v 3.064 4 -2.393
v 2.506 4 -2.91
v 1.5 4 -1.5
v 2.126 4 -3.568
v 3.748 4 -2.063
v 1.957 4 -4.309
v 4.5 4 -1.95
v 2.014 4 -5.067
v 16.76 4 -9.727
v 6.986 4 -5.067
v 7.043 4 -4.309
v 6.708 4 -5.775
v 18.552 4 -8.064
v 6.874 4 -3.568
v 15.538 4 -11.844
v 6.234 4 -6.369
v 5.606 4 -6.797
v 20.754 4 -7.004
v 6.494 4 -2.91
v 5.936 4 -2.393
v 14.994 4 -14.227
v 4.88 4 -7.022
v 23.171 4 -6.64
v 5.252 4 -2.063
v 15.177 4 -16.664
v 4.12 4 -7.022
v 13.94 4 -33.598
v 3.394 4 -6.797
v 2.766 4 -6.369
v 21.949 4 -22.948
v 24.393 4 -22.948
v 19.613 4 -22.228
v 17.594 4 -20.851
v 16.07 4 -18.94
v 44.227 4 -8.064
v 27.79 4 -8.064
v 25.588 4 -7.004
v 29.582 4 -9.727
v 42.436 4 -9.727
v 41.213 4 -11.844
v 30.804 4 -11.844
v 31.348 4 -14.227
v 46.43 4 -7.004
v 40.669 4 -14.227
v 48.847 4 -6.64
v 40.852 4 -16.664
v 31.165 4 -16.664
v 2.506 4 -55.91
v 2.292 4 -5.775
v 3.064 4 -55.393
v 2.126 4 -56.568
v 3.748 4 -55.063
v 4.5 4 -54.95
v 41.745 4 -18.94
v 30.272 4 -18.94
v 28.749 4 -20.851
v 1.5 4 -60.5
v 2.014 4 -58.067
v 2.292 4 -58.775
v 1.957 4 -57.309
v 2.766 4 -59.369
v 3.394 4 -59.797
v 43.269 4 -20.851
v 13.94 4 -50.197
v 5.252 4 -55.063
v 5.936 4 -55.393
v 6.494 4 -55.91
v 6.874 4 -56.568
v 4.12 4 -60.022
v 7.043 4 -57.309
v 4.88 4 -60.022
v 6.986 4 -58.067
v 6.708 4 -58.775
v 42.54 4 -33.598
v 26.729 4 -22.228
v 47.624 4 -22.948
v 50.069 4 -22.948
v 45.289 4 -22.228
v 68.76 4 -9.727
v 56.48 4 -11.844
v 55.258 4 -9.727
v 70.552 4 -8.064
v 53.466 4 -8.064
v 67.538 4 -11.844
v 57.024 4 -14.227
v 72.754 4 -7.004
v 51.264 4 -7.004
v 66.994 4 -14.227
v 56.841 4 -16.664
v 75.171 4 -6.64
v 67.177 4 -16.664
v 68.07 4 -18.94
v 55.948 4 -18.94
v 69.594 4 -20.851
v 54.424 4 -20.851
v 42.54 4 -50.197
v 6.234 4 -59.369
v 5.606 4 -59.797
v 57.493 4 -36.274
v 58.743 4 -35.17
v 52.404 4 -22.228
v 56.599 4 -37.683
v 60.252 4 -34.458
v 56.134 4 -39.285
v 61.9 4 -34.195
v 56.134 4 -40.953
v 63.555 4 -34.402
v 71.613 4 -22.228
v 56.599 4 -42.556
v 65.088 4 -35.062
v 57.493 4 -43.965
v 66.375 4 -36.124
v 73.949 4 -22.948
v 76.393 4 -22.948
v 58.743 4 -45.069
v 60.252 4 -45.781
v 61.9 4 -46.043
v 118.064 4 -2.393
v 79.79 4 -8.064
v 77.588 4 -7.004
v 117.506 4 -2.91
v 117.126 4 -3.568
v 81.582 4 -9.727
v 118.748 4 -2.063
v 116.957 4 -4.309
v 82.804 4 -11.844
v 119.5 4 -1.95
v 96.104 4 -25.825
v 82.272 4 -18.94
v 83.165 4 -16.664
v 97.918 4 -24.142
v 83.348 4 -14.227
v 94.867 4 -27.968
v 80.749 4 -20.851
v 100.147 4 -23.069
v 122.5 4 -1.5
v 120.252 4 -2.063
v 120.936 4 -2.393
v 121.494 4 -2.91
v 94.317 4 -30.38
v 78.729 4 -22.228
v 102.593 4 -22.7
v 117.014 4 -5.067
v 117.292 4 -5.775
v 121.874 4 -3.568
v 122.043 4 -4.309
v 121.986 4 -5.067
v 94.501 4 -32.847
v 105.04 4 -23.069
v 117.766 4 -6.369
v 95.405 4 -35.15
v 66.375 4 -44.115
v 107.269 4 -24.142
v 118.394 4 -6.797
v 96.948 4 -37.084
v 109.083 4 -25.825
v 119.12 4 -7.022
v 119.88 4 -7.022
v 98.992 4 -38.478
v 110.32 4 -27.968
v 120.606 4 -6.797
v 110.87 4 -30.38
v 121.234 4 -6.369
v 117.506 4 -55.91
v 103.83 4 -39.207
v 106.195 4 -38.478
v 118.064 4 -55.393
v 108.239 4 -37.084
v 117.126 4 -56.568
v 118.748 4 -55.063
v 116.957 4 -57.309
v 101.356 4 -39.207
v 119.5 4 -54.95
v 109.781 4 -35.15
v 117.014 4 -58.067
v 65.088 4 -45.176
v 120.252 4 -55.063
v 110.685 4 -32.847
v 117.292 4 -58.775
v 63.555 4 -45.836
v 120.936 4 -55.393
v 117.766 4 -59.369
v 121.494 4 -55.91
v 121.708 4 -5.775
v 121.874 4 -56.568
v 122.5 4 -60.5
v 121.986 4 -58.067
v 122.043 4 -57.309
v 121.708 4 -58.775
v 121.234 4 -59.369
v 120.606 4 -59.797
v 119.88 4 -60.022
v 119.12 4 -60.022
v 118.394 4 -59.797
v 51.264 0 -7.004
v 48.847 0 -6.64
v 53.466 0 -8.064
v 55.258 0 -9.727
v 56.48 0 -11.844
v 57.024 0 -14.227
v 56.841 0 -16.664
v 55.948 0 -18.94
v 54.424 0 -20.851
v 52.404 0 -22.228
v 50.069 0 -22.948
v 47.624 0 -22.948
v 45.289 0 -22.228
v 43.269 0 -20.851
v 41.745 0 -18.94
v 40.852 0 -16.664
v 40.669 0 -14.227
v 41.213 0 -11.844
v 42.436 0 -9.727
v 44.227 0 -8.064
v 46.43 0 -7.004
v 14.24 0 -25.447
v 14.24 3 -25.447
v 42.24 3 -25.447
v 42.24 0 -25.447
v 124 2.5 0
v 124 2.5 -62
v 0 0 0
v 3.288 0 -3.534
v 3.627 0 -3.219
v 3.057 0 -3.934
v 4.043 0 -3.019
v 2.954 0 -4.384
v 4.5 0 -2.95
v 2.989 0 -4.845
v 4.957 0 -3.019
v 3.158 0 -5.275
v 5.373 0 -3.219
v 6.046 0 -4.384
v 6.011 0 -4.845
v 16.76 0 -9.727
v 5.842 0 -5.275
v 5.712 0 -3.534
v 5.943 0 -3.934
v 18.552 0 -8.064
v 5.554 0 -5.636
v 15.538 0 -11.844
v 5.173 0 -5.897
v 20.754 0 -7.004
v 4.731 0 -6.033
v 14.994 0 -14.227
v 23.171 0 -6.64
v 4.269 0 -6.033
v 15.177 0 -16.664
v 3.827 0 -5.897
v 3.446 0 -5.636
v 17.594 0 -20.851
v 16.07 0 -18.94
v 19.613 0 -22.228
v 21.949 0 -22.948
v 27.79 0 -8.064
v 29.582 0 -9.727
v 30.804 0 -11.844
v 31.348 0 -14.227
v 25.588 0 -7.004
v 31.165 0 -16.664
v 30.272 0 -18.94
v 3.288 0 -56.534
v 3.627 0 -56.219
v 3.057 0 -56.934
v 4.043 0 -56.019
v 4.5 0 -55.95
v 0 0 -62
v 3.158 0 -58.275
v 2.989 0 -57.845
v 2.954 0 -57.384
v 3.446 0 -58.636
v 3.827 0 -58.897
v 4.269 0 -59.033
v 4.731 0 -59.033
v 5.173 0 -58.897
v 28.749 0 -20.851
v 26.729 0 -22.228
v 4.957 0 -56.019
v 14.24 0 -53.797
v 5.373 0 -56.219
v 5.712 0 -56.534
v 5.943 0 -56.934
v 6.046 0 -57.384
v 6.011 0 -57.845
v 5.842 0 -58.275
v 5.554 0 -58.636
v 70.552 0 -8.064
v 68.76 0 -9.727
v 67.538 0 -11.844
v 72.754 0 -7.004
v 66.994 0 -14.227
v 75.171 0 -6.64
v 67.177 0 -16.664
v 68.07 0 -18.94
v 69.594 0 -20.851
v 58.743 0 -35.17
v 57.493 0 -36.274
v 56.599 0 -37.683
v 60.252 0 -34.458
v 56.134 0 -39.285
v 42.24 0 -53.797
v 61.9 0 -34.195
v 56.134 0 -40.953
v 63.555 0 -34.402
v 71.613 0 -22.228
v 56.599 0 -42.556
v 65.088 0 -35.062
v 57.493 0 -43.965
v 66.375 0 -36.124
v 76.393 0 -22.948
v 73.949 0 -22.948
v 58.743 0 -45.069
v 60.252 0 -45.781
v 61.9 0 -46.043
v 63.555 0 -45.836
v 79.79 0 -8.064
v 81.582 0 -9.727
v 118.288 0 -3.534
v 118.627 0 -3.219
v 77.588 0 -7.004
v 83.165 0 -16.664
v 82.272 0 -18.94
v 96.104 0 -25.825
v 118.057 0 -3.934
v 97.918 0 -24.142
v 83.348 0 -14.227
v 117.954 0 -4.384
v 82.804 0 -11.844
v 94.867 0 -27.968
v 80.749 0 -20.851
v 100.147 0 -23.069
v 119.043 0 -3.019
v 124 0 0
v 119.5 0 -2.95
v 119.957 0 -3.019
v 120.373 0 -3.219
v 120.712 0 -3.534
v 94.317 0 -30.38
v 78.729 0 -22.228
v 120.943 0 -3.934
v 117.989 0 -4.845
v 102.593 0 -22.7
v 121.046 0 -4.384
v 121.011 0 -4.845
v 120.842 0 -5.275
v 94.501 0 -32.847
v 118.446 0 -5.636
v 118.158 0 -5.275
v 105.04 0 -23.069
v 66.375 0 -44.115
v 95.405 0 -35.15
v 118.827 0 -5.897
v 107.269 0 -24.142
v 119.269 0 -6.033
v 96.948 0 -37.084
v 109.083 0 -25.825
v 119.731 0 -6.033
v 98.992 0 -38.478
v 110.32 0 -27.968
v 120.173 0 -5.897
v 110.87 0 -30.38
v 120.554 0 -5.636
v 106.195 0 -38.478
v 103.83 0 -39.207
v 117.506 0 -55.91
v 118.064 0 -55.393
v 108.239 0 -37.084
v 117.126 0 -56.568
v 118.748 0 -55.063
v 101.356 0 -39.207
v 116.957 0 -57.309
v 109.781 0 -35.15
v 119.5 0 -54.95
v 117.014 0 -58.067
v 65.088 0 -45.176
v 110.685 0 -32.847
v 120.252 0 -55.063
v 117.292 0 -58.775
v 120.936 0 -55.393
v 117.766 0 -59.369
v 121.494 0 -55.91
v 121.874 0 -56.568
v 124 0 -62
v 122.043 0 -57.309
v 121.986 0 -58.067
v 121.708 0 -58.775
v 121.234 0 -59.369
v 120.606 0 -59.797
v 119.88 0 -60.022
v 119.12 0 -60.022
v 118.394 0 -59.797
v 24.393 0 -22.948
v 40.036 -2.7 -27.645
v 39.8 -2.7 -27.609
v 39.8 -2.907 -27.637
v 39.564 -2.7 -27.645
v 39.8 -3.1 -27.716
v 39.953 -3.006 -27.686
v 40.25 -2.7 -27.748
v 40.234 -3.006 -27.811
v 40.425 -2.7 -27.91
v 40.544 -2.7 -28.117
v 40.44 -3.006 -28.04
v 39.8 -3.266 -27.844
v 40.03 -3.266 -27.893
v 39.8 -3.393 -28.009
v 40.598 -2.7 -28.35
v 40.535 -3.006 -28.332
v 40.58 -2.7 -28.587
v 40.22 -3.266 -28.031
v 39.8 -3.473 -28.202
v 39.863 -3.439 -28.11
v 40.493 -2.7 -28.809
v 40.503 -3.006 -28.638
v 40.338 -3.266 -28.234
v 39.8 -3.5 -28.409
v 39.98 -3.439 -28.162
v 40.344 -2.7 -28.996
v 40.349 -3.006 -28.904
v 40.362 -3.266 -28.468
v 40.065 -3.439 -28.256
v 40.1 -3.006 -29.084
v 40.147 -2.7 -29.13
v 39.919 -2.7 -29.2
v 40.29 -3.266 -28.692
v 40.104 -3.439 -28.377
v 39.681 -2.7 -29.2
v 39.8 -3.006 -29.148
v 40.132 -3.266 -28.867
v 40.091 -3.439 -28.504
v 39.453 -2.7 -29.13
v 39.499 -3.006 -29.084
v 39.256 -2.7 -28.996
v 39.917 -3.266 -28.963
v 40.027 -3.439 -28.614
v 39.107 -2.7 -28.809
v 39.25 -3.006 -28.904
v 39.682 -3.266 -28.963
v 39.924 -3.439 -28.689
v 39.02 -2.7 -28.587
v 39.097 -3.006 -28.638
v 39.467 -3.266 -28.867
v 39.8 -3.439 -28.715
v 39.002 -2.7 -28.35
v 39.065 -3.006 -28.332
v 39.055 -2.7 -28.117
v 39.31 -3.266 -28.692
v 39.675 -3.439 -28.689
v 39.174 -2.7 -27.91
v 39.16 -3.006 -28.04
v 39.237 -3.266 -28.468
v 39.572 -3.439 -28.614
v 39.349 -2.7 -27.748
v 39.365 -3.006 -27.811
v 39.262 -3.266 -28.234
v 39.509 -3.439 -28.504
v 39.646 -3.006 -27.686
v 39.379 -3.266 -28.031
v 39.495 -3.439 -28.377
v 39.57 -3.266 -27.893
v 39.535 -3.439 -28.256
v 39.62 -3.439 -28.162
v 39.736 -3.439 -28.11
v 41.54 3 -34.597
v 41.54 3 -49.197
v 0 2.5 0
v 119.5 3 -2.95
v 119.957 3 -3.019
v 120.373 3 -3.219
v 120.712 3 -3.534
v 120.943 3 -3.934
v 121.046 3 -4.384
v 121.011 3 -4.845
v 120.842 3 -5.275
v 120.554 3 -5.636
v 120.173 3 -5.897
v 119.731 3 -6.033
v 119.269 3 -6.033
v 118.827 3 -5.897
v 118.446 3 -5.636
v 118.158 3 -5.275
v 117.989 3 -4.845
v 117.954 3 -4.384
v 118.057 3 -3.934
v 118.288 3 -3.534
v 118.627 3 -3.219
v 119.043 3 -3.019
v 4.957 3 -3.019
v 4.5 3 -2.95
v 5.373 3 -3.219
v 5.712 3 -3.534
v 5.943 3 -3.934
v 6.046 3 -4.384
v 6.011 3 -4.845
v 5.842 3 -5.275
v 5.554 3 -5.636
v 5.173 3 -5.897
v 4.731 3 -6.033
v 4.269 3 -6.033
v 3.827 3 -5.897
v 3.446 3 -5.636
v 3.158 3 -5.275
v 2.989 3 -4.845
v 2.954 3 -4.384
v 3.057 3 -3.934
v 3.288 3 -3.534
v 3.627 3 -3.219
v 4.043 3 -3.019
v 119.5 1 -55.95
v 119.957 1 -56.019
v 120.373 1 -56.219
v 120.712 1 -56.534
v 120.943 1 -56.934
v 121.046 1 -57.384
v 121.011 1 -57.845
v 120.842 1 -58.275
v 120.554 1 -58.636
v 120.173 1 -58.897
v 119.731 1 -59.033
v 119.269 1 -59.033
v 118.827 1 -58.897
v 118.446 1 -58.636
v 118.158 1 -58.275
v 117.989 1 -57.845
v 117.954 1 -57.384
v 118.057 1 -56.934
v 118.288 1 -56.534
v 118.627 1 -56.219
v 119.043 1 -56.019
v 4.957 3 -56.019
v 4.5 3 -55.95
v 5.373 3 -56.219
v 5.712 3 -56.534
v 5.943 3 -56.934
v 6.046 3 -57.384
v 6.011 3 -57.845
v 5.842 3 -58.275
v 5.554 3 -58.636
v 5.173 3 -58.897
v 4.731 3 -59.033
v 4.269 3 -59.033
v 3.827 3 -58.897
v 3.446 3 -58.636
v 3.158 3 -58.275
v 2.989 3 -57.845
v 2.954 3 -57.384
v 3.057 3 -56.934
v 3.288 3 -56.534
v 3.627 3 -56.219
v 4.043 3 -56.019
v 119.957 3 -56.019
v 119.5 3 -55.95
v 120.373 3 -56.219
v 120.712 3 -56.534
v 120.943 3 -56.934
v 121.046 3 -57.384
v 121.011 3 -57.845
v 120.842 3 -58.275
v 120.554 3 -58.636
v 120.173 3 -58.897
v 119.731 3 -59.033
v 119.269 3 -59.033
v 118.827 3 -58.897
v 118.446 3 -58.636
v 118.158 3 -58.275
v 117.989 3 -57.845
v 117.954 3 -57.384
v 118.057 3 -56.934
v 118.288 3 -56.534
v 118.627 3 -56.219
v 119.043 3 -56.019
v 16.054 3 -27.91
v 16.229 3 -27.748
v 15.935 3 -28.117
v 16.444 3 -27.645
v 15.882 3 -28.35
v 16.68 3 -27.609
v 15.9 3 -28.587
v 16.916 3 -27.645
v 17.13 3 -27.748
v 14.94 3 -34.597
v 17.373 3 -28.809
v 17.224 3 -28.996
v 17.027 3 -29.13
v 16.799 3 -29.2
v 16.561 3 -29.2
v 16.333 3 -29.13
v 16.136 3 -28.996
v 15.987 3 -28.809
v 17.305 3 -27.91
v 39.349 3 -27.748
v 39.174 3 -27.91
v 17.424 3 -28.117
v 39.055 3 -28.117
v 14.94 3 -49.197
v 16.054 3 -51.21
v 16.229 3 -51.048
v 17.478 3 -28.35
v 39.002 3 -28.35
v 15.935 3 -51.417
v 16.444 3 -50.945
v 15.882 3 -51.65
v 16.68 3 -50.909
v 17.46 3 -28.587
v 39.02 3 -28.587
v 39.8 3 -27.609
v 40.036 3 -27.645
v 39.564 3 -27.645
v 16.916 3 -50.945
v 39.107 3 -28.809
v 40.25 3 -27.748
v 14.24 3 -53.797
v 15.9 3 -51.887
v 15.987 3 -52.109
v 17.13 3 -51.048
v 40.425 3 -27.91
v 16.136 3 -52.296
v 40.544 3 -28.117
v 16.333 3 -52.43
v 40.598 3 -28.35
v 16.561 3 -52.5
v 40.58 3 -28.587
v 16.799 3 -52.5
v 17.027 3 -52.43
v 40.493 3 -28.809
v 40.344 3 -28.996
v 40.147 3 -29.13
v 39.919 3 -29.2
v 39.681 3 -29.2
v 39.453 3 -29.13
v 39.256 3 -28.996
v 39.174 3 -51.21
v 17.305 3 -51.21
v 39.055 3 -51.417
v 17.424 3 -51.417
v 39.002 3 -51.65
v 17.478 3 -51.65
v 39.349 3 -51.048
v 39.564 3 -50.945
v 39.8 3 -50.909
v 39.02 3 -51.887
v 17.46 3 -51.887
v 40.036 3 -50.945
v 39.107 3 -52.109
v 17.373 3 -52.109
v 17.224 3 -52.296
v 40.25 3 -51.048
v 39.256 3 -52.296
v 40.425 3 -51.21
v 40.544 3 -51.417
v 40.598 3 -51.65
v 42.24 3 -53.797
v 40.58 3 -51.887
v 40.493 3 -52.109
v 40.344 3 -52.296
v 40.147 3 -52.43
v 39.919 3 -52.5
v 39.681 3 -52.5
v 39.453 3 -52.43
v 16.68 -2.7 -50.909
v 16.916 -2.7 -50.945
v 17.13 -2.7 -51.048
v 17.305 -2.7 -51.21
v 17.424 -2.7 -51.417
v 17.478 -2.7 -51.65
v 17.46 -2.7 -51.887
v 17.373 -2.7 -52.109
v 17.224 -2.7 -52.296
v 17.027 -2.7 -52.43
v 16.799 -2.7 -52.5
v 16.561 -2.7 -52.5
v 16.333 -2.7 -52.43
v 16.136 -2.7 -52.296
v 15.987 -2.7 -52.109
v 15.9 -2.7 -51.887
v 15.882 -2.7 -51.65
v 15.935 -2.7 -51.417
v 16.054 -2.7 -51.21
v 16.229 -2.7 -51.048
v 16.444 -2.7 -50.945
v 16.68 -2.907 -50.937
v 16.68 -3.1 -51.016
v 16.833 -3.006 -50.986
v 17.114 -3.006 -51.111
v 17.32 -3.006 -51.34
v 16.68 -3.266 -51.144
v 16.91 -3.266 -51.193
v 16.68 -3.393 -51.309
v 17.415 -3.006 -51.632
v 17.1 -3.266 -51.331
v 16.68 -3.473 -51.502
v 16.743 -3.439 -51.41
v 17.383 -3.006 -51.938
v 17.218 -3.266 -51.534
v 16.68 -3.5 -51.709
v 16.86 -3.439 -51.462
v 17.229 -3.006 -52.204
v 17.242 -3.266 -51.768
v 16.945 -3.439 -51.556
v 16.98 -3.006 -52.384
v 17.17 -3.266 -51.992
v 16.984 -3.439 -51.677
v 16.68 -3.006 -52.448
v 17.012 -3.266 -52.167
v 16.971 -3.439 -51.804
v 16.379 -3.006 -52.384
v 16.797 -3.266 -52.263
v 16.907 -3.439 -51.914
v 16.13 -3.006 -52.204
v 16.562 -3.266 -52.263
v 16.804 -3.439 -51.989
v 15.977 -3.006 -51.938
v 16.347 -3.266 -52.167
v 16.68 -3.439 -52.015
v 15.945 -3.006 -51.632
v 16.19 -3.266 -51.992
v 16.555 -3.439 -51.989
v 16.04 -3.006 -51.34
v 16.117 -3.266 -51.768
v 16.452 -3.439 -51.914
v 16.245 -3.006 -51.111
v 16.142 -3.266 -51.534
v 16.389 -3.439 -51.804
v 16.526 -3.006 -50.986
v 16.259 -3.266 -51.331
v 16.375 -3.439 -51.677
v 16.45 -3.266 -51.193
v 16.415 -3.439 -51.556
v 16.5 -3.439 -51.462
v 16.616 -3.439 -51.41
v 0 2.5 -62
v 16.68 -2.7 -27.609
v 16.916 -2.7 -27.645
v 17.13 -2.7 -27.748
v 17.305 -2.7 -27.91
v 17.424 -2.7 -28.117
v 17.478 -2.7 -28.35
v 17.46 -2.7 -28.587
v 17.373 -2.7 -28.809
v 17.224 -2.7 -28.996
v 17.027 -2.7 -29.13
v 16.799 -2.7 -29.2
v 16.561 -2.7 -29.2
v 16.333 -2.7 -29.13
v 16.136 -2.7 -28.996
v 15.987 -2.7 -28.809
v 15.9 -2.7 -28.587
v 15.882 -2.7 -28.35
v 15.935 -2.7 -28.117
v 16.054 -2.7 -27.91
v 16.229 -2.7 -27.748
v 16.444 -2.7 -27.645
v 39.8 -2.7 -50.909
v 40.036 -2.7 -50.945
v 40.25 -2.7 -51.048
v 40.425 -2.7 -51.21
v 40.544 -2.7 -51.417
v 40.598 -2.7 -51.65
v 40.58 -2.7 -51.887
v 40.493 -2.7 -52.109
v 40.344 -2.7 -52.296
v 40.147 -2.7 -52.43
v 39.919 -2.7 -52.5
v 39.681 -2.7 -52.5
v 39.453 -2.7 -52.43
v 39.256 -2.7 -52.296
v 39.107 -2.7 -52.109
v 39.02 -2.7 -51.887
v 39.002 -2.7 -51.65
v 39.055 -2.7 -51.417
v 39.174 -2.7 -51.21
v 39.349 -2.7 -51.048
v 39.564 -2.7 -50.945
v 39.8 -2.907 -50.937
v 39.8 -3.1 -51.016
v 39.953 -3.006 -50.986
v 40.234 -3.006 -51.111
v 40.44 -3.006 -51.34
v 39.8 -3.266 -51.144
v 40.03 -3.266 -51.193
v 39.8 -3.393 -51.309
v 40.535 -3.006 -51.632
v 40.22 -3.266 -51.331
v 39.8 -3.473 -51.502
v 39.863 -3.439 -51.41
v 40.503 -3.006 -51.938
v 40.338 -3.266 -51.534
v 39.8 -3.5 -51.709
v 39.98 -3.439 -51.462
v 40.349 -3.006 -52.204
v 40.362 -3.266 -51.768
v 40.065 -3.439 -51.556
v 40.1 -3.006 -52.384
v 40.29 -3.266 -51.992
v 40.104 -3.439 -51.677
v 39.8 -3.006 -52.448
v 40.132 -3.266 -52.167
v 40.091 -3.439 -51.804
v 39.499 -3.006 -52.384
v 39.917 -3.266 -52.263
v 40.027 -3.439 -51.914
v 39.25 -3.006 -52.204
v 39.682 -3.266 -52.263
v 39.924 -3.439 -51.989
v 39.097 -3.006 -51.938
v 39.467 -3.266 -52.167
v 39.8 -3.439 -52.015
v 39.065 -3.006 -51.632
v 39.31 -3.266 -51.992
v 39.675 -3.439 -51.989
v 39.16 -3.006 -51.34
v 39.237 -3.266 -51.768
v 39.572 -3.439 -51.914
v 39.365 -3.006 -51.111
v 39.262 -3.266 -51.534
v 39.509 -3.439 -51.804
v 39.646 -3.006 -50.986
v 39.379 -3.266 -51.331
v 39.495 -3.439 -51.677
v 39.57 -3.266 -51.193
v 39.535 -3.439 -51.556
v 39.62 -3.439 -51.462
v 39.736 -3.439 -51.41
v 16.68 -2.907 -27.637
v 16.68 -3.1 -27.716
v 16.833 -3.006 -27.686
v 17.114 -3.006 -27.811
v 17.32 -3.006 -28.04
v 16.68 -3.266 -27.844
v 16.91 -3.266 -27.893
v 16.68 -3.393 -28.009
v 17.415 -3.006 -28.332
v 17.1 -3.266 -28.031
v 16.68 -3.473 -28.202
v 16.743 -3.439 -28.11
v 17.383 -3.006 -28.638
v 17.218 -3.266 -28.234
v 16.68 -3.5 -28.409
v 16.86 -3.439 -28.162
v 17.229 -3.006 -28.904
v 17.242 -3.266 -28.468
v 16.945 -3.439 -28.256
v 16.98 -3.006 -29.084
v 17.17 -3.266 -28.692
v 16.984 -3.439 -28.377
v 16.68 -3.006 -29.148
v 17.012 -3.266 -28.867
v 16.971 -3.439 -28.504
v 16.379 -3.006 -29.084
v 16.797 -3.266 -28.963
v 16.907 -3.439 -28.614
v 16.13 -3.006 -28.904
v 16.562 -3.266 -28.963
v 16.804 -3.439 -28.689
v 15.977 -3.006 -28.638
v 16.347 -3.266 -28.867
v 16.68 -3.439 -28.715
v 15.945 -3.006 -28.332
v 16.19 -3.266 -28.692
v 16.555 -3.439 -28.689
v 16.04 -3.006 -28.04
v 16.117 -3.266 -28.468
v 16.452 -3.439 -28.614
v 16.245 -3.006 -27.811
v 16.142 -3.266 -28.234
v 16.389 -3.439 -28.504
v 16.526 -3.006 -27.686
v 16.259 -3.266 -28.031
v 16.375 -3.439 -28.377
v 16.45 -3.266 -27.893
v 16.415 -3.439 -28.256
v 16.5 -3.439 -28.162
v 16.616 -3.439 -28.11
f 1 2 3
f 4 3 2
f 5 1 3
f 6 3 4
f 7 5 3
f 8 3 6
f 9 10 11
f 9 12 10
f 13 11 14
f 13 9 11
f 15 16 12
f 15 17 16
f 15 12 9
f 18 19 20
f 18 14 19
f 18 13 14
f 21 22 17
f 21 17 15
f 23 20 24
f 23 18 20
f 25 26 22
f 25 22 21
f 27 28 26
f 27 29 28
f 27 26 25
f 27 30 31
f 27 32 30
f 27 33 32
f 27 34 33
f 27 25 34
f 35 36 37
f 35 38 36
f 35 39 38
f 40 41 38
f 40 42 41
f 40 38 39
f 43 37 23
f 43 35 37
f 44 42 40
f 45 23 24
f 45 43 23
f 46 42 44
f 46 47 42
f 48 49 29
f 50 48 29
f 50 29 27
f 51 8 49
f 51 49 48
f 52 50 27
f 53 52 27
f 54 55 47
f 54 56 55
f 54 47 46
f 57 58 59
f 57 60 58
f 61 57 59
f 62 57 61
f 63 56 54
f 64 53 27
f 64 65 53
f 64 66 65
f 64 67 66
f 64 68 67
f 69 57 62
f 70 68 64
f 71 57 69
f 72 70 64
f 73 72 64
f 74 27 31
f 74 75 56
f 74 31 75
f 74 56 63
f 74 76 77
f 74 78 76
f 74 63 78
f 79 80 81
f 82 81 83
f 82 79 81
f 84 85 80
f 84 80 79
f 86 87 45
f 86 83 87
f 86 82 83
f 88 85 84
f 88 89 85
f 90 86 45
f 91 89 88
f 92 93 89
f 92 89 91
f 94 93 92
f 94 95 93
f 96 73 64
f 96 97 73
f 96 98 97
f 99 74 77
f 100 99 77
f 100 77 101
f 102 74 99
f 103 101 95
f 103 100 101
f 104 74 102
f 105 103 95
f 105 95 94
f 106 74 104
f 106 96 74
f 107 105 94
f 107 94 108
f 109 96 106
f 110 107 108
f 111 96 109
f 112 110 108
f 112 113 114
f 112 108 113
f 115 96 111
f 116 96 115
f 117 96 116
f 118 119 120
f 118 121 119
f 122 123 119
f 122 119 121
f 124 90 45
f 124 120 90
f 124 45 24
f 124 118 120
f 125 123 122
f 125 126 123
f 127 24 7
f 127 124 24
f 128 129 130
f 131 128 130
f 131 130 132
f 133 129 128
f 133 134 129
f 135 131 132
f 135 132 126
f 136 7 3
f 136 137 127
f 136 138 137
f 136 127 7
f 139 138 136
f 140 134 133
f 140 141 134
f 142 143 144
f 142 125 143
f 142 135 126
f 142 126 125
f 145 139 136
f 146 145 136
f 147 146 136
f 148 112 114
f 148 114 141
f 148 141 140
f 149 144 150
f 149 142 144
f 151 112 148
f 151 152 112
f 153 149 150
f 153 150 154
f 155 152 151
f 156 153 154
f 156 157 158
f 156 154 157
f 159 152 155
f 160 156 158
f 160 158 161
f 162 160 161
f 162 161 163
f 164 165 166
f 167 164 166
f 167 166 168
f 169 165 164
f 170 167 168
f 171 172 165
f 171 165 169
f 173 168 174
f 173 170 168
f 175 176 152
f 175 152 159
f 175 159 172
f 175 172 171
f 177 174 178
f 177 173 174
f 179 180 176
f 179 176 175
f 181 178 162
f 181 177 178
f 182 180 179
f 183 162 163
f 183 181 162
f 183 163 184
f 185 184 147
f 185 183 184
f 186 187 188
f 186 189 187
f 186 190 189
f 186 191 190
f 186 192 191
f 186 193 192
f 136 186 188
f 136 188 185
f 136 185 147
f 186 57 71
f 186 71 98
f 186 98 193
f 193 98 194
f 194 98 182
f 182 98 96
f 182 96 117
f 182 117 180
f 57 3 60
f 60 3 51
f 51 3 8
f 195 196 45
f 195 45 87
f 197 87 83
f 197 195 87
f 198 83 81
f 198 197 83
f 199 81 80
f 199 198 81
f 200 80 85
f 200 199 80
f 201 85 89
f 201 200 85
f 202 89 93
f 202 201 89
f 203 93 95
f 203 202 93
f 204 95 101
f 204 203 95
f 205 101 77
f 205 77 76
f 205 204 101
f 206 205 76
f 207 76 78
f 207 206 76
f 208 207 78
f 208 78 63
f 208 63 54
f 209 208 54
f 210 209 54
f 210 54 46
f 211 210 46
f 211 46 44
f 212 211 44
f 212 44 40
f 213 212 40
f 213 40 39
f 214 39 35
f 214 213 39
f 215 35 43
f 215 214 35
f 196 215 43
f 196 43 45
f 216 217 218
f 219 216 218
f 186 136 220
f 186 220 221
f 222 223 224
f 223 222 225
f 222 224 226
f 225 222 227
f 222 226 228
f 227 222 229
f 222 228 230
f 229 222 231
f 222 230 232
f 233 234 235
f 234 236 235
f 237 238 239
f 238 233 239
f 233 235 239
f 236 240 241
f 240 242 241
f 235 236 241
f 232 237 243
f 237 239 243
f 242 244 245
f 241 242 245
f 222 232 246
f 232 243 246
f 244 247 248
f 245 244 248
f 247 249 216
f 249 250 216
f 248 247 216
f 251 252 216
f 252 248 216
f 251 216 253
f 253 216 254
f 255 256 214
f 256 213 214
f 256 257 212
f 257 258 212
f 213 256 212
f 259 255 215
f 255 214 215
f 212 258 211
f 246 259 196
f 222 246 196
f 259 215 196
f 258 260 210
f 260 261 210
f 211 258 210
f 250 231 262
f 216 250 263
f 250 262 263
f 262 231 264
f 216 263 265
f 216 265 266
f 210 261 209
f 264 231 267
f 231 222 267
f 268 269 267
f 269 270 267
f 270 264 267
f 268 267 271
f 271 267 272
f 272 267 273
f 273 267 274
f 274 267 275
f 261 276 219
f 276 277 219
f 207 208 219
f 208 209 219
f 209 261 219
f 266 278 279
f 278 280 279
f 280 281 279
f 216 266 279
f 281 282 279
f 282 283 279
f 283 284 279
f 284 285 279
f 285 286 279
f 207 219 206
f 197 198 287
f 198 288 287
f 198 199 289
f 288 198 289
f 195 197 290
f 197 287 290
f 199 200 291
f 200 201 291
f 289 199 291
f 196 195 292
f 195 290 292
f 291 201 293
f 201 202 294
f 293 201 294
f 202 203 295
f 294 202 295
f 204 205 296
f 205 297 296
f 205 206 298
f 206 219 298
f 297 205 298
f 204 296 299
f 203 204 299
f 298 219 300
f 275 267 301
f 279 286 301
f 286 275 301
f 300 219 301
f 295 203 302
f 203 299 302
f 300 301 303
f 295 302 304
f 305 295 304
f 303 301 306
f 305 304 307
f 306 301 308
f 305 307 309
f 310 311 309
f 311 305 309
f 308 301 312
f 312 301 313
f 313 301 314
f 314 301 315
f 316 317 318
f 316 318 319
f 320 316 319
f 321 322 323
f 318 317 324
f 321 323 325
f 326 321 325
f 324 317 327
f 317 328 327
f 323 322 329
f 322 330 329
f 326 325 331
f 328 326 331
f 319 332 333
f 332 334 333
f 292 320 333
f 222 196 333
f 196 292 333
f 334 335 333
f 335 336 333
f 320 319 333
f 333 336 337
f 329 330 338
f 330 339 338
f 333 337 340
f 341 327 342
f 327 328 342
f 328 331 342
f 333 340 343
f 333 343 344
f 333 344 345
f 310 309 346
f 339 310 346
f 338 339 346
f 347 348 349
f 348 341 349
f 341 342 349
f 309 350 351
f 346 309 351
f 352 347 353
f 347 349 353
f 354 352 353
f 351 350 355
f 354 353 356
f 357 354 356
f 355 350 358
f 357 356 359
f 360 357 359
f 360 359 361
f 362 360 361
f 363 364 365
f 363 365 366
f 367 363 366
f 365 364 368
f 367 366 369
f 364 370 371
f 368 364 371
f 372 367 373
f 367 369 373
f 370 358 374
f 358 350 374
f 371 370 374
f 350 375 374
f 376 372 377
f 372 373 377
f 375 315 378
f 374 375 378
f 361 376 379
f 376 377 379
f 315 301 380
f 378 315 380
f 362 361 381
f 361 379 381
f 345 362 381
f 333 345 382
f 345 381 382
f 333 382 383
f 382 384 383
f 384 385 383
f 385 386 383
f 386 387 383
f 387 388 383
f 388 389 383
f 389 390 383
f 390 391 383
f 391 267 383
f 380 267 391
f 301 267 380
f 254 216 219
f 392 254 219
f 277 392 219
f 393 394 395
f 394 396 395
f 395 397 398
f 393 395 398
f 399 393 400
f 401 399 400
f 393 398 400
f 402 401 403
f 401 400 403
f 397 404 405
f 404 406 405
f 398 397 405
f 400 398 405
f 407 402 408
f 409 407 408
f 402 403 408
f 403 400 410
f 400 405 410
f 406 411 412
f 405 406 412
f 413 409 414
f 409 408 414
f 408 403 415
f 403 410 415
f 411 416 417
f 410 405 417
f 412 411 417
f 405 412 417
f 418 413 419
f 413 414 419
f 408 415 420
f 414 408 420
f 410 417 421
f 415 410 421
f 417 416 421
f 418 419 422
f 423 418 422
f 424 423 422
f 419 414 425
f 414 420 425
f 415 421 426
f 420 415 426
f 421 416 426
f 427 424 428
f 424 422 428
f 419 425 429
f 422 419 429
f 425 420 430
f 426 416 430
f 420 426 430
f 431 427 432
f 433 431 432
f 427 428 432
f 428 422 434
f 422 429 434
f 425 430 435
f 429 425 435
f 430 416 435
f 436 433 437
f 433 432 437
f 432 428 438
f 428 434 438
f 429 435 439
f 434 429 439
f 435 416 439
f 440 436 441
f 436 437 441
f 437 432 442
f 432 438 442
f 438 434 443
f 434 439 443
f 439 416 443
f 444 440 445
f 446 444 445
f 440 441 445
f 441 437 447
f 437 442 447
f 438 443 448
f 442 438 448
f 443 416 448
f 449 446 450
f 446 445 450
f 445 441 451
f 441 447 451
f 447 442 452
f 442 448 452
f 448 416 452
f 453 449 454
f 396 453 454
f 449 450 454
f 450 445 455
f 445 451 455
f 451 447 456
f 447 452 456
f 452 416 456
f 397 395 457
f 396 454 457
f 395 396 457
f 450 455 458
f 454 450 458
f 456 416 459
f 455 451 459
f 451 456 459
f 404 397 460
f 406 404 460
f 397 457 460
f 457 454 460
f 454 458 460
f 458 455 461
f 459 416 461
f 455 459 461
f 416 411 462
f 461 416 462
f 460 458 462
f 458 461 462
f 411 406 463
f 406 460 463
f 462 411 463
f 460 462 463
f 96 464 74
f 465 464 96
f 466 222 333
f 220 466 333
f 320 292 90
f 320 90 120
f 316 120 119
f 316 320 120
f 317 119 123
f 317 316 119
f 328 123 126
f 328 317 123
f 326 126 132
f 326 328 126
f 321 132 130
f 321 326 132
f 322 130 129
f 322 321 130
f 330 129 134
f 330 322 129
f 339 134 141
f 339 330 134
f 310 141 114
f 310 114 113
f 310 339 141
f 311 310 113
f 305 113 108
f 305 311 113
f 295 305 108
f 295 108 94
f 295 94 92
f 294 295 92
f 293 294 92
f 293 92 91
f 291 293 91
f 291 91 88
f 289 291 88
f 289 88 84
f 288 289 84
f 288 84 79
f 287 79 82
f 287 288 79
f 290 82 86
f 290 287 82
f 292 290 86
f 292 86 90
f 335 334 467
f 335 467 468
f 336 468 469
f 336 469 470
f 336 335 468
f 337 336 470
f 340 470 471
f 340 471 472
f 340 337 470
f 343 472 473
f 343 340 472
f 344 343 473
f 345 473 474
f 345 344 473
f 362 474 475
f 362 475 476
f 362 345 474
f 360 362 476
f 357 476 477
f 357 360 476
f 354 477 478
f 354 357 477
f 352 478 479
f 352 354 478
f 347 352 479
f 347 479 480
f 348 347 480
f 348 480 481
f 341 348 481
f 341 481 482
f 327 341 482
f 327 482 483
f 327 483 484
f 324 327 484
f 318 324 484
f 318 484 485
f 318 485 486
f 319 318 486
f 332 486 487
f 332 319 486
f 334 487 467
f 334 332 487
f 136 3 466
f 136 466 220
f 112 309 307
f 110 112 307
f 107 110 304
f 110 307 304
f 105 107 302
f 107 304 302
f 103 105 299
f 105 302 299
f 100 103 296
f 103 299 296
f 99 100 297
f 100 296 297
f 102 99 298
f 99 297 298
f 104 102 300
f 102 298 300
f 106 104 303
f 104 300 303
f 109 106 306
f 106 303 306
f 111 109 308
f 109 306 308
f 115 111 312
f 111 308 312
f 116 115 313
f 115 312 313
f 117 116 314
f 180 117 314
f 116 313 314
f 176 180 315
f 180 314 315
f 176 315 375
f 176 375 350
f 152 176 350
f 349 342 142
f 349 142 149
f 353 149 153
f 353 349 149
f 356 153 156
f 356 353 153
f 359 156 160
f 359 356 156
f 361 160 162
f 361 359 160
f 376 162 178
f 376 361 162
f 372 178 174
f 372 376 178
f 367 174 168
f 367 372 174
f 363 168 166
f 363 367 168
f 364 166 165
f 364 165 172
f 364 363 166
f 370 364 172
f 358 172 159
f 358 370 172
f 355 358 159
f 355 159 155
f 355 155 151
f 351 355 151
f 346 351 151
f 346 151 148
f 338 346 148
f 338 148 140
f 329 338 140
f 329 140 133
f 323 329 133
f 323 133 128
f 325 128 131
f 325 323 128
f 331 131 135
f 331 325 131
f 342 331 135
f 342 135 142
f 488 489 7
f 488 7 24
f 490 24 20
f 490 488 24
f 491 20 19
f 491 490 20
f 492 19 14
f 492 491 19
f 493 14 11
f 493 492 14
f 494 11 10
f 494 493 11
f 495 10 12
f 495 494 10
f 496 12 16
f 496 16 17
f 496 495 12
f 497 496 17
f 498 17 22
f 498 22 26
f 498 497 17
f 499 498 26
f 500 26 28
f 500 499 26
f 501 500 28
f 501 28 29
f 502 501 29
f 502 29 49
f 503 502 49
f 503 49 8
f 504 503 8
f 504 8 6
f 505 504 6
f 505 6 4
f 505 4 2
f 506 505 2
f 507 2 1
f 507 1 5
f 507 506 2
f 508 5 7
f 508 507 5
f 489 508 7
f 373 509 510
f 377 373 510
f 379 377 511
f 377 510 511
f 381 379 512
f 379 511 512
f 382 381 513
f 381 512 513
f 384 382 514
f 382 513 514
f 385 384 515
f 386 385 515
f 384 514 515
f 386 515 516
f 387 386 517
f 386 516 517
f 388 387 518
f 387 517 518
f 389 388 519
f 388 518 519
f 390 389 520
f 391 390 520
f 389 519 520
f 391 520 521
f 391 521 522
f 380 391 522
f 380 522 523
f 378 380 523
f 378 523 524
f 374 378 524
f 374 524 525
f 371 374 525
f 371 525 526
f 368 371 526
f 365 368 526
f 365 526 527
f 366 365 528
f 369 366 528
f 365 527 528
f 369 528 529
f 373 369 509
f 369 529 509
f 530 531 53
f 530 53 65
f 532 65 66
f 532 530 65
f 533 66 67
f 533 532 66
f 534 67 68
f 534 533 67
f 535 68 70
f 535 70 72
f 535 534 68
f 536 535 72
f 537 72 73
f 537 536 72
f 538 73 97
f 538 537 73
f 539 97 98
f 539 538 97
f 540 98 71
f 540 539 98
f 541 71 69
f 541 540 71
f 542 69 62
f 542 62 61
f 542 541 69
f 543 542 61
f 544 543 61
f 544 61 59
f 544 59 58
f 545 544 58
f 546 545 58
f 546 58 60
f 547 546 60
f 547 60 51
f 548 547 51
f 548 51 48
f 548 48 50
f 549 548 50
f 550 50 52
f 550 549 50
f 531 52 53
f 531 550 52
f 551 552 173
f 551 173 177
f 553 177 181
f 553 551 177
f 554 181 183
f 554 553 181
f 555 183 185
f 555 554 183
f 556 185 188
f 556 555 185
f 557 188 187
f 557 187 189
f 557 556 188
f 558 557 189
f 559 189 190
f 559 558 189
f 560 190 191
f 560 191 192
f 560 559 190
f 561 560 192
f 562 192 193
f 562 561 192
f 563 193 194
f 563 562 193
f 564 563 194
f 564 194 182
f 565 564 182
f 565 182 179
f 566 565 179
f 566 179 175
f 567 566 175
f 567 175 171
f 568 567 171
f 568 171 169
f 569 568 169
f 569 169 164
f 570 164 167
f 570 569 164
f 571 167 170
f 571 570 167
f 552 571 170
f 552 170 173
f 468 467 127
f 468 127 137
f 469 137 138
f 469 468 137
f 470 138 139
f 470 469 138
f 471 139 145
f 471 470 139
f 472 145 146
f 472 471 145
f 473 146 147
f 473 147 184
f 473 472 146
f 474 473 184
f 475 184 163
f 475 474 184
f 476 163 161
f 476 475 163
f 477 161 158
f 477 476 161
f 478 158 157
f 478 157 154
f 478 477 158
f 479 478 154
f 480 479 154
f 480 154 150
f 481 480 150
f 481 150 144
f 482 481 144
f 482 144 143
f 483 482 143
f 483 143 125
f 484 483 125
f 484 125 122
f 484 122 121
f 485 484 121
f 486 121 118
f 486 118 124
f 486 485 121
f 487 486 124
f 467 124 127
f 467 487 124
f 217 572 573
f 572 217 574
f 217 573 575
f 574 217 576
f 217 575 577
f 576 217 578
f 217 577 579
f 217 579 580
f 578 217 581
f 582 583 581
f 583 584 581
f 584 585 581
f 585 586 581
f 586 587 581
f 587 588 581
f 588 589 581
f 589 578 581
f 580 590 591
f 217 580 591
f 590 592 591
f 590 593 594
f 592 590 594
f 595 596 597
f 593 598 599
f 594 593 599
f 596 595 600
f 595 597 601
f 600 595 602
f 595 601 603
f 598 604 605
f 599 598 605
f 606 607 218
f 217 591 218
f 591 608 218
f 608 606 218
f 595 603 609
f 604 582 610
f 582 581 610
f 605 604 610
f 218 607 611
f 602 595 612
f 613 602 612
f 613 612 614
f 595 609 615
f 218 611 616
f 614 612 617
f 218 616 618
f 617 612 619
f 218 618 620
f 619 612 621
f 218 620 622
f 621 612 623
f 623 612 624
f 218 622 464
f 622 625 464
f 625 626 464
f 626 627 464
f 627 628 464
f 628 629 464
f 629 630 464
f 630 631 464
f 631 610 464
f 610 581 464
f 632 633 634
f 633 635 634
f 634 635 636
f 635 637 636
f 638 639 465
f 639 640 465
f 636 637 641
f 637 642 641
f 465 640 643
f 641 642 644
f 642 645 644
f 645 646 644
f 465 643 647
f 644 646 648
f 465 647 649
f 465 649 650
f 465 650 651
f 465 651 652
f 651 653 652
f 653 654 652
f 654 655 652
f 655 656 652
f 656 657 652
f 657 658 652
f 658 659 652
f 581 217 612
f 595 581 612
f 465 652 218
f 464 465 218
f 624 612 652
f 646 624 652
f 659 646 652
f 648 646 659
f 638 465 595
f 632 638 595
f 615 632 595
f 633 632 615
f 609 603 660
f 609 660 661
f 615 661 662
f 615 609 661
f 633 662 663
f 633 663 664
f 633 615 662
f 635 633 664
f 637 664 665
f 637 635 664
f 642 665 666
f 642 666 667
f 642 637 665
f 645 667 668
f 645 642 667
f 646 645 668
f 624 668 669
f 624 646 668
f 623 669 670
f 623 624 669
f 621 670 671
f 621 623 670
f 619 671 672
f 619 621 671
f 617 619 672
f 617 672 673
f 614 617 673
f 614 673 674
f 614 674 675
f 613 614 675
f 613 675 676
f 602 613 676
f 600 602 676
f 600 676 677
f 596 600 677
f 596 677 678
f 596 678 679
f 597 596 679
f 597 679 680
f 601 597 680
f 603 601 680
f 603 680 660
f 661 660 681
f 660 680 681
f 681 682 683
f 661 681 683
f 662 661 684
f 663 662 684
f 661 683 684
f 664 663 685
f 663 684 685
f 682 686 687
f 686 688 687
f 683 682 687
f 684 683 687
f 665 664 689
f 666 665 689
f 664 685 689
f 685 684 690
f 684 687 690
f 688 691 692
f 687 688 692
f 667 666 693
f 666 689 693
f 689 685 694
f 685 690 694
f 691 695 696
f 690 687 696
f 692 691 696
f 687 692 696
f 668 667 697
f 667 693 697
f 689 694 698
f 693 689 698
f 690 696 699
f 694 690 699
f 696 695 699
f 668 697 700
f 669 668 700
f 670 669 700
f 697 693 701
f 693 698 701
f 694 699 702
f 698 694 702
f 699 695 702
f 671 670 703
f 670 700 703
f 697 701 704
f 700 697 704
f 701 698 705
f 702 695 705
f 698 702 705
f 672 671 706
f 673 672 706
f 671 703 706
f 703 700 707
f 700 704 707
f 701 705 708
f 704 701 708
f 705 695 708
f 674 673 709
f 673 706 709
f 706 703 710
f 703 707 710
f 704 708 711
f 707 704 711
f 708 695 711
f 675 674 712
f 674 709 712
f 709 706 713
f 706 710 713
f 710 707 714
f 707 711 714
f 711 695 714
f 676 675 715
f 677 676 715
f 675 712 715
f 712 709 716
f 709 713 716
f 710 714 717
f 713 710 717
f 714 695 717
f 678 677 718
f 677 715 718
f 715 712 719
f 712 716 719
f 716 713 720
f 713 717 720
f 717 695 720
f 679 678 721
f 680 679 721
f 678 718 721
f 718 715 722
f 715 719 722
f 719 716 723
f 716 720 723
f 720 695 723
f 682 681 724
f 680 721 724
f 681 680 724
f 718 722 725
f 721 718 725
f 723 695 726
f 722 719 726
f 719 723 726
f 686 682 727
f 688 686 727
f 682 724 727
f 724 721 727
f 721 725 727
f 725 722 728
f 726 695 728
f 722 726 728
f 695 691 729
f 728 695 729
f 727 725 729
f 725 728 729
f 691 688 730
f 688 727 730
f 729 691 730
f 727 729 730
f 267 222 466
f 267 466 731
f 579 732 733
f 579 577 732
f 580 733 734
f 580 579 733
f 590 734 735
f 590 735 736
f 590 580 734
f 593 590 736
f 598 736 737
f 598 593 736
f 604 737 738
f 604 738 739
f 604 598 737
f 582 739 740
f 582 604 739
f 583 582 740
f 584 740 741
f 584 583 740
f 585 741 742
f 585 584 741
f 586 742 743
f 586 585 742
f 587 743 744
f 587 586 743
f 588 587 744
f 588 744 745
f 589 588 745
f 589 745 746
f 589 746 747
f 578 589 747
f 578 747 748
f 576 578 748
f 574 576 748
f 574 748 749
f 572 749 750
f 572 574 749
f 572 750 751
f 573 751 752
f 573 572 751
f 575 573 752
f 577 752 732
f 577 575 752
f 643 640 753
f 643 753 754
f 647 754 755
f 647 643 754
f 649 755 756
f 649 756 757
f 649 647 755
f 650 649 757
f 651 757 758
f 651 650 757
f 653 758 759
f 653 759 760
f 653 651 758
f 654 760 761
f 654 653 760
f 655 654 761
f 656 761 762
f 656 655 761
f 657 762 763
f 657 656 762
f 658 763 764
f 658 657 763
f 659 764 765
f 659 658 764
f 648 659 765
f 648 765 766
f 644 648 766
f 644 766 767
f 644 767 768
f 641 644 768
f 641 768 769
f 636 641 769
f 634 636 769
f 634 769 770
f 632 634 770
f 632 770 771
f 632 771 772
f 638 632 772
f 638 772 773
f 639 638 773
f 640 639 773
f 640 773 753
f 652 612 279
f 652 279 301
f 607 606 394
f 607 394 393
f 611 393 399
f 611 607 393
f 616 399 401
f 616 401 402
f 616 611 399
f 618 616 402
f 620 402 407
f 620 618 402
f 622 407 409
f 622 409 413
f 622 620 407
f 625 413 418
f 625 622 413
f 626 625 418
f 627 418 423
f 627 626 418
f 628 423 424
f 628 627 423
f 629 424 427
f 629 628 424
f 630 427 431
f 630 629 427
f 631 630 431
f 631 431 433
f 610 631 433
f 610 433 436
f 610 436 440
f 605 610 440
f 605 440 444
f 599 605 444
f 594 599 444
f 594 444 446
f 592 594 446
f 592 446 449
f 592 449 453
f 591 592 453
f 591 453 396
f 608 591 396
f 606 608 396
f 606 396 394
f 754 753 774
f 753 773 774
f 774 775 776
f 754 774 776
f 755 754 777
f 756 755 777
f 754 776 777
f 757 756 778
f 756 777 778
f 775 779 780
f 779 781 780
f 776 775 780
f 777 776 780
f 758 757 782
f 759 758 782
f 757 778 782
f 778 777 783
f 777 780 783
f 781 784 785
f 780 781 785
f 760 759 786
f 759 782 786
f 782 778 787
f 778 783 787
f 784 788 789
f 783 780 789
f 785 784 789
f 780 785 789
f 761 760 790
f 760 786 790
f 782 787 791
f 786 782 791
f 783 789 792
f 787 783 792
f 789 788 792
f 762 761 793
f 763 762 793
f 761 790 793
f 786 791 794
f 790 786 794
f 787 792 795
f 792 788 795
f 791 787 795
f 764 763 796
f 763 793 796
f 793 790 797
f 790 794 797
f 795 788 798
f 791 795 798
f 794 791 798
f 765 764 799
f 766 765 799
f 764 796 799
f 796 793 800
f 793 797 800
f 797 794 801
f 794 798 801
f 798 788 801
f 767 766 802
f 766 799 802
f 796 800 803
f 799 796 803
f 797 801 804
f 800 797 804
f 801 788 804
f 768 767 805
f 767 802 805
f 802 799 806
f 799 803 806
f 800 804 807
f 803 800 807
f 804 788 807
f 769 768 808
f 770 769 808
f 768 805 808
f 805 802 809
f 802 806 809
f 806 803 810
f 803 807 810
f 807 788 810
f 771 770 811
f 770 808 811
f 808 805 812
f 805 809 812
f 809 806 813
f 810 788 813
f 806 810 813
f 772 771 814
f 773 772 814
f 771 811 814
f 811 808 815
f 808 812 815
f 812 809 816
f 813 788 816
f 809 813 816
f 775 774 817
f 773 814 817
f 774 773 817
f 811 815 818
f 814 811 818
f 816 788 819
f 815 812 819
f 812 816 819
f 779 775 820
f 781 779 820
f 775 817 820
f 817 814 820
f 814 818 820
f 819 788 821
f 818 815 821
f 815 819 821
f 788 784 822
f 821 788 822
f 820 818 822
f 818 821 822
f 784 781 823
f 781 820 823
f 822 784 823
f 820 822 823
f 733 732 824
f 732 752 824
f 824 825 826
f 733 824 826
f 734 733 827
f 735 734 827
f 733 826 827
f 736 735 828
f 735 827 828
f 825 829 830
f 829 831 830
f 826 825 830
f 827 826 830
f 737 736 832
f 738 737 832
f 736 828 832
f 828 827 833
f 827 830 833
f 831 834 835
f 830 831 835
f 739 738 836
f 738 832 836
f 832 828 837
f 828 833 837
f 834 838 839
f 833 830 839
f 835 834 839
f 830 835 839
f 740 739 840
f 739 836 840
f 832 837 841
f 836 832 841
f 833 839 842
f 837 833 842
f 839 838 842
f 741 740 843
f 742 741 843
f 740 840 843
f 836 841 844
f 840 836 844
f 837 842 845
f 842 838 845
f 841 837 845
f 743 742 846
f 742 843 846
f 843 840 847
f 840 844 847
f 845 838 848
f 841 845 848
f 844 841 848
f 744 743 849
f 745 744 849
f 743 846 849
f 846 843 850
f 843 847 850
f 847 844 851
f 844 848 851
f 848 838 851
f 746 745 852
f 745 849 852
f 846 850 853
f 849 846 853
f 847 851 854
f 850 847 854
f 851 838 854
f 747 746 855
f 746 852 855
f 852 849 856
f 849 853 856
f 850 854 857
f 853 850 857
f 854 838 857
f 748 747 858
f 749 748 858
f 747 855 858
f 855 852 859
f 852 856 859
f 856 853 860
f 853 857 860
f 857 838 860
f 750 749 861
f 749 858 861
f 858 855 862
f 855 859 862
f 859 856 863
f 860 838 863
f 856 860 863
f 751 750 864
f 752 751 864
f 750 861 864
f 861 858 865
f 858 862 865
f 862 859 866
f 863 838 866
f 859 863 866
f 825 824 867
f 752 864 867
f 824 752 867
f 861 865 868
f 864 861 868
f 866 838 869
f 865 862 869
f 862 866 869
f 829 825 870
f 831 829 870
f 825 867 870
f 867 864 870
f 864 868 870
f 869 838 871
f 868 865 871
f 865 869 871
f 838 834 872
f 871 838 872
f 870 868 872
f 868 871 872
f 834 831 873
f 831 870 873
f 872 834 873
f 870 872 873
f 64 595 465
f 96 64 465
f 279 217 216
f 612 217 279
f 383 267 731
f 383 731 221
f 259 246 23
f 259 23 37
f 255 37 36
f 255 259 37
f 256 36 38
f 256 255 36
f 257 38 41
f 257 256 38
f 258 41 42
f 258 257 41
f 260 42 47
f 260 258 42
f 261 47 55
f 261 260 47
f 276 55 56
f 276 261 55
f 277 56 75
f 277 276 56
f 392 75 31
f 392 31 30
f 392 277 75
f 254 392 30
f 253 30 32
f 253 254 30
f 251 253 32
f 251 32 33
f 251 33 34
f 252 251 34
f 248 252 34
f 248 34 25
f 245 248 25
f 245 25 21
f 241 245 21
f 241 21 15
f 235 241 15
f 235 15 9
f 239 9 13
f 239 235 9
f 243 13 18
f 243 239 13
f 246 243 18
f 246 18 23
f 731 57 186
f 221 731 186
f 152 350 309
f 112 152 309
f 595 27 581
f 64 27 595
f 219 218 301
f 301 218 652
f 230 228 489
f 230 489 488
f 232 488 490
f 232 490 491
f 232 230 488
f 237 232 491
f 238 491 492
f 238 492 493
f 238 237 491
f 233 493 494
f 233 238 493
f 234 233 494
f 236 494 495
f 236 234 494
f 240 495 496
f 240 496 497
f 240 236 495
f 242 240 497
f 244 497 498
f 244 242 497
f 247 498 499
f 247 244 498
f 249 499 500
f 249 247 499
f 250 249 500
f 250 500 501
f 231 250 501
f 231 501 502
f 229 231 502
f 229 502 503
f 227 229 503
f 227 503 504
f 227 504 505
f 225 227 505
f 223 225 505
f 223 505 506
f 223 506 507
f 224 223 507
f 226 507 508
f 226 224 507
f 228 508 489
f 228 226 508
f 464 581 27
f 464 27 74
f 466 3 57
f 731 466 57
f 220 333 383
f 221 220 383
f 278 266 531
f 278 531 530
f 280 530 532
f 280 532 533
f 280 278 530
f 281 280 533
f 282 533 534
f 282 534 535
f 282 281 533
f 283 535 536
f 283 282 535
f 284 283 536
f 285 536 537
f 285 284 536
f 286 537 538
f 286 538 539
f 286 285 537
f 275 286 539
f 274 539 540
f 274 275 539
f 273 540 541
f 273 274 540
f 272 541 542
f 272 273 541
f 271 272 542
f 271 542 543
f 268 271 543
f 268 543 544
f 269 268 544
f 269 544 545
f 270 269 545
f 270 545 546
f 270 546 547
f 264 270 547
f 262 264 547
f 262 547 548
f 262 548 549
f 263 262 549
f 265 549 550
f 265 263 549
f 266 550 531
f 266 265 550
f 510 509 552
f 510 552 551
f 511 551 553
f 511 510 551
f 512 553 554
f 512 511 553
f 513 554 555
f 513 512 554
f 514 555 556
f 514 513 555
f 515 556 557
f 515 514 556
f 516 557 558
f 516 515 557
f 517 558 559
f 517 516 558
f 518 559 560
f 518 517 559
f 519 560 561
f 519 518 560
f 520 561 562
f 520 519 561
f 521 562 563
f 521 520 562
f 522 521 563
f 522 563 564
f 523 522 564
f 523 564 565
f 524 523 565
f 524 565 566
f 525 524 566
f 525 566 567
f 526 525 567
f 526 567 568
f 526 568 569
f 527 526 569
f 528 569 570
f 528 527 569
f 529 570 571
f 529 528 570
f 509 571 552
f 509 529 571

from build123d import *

# Parameters (mm, degrees)
SKETCH2_W           = 124
SKETCH2_H           = 62
SKETCH2_R           = 1.55
SKETCH2_W_2         = 26.6
SKETCH2_H_2         = 14.6
SKETCH2_R_2         = 8.3
SKETCH2_R_3         = 8.2
BOSS_EXTRUDE1_DEPTH = 4
CHAMFER1_SIZE       = 1.5
CHAMFER2_SIZE       = 1
SKETCH2_3_R         = 0.8
BOSS_EXTRUDE2_DEPTH = 3.5
FILLET1_R           = 0.8
CUT_EXTRUDE1_START  = 3
SKETCH2_4_W         = 28
SKETCH2_4_H         = 28.35
SKETCH2_4_R         = 0.8
SKETCH2_4_W_2       = 26.6
SKETCH2_4_H_2       = 14.6
CUT_EXTRUDE1_DEPTH  = 3
CHAMFER3_SIZE       = 1


with BuildPart() as part:
    # Sketch2 → Boss-Extrude1 (new body)
    with BuildSketch(Plane(origin=(0, 0, 0), x_dir=(1, 0, 0), z_dir=(0, 1, 0))):
        with Locations((62, 31)):
            Rectangle(SKETCH2_W, SKETCH2_H)
        with Locations(Location((4.5, 4.5, 0), (0, 0, 270))):
            Circle(SKETCH2_R, mode=Mode.SUBTRACT)
        with Locations(Location((119.5, 4.5, 0), (0, 0, 270))):
            Circle(SKETCH2_R, mode=Mode.SUBTRACT)
        with Locations(Location((4.5, 57.5, 0), (0, 0, 270))):
            Circle(SKETCH2_R, mode=Mode.SUBTRACT)
        with Locations(Location((119.5, 57.5, 0), (0, 0, 270))):
            Circle(SKETCH2_R, mode=Mode.SUBTRACT)
        with Locations((28.239743387, 41.89740921)):
            Rectangle(SKETCH2_W_2, SKETCH2_H_2, mode=Mode.SUBTRACT)
        with Locations(Location((102.593331931, 31, 0), (0, 0, 270))):
            Circle(SKETCH2_R_2, mode=Mode.SUBTRACT)
        with Locations(Location((75.171087178, 14.839562505, 0), (0, 0, 270))):
            Circle(SKETCH2_R_3, mode=Mode.SUBTRACT)
        with BuildLine():
            ThreePointArc((66.375, 36.123659504), (56.075, 40.119282109), (66.375, 44.114904714))
            Line((66.375, 44.114904714), (66.375, 36.123659504))
        make_face(mode=Mode.SUBTRACT)
        with Locations(Location((48.846547615, 14.839562505, 0), (0, 0, 270))):
            Circle(SKETCH2_R_3, mode=Mode.SUBTRACT)
        with Locations(Location((23.171087178, 14.839562505, 0), (0, 0, 270))):
            Circle(SKETCH2_R_3, mode=Mode.SUBTRACT)
    extrude(amount=BOSS_EXTRUDE1_DEPTH)

    # Chamfer1
    chamfer1_edges = [part.edges().sort_by_distance(p)[0] for p in [
        (62, 4, 0),
        (124, 4, -31),
        (62, 4, -62),
        (0, 4, -31),
    ]]
    chamfer(chamfer1_edges, length=CHAMFER1_SIZE)

    # Chamfer2
    chamfer2_edges = [part.edges().sort_by_distance(p)[0] for p in [
        (119.5, 0, -59.05),
        (4.5, 4, -6.05),
        (119.5, 4, -59.05),
        (119.5, 4, -6.05),
        (4.5, 4, -59.05),
    ]]
    chamfer(chamfer2_edges, length=CHAMFER2_SIZE)

    # Sketch2<3> → Boss-Extrude2 (add)
    with BuildSketch(Plane(origin=(0, 0, 0), x_dir=(1, 0, 0), z_dir=(0, 1, 0))):
        with Locations(Location((16.679743387, 28.409287577, 0), (0, 0, 270))):
            Circle(SKETCH2_3_R)
        with Locations(Location((16.679743387, 51.709287577, 0), (0, 0, 270))):
            Circle(SKETCH2_3_R)
        with Locations(Location((39.799743387, 28.409287577, 0), (0, 0, 270))):
            Circle(SKETCH2_3_R)
        with Locations(Location((39.799743387, 51.709287577, 0), (0, 0, 270))):
            Circle(SKETCH2_3_R)
    extrude(amount=-BOSS_EXTRUDE2_DEPTH)

    # Fillet1
    fillet1_edges = [part.edges().sort_by_distance(p)[0] for p in [
        (39.799743387, -3.5, -29.209287577),
        (39.799743387, -3.5, -52.509287577),
        (16.679743387, -3.5, -29.209287577),
        (16.679743387, -3.5, -52.509287577),
    ]]
    fillet(fillet1_edges, radius=FILLET1_R)

    # Sketch2<4> → Cut-Extrude1 (cut)
    with BuildSketch(Plane(origin=(0, 0, 0), x_dir=(1, 0, 0), z_dir=(0, 1, 0)).offset(CUT_EXTRUDE1_START)):
        with Locations((28.239743387, 39.62240921)):
            Rectangle(SKETCH2_4_W, SKETCH2_4_H)
        with Locations(Location((16.679743387, 51.709287577, 0), (0, 0, 270))):
            Circle(SKETCH2_4_R, mode=Mode.SUBTRACT)
        with Locations(Location((16.679743387, 28.409287577, 0), (0, 0, 270))):
            Circle(SKETCH2_4_R, mode=Mode.SUBTRACT)
        with Locations(Location((39.799743387, 28.409287577, 0), (0, 0, 270))):
            Circle(SKETCH2_4_R, mode=Mode.SUBTRACT)
        with Locations(Location((39.799743387, 51.709287577, 0), (0, 0, 270))):
            Circle(SKETCH2_4_R, mode=Mode.SUBTRACT)
        with Locations((28.239743387, 41.89740921)):
            Rectangle(SKETCH2_4_W_2, SKETCH2_4_H_2, mode=Mode.SUBTRACT)
    extrude(amount=-CUT_EXTRUDE1_DEPTH, mode=Mode.SUBTRACT)

    # Chamfer3
    chamfer3_edges = [part.edges().sort_by_distance(p)[0] for p in [
        (28.239743387, 4, -34.59740921),
        (41.539743387, 4, -41.89740921),
        (14.939743387, 4, -41.89740921),
        (28.239743387, 4, -49.19740921),
    ]]
    chamfer(chamfer3_edges, length=CHAMFER3_SIZE - 0.0001)  # a hair under: the kernel refuses the full size


solid = part.part
